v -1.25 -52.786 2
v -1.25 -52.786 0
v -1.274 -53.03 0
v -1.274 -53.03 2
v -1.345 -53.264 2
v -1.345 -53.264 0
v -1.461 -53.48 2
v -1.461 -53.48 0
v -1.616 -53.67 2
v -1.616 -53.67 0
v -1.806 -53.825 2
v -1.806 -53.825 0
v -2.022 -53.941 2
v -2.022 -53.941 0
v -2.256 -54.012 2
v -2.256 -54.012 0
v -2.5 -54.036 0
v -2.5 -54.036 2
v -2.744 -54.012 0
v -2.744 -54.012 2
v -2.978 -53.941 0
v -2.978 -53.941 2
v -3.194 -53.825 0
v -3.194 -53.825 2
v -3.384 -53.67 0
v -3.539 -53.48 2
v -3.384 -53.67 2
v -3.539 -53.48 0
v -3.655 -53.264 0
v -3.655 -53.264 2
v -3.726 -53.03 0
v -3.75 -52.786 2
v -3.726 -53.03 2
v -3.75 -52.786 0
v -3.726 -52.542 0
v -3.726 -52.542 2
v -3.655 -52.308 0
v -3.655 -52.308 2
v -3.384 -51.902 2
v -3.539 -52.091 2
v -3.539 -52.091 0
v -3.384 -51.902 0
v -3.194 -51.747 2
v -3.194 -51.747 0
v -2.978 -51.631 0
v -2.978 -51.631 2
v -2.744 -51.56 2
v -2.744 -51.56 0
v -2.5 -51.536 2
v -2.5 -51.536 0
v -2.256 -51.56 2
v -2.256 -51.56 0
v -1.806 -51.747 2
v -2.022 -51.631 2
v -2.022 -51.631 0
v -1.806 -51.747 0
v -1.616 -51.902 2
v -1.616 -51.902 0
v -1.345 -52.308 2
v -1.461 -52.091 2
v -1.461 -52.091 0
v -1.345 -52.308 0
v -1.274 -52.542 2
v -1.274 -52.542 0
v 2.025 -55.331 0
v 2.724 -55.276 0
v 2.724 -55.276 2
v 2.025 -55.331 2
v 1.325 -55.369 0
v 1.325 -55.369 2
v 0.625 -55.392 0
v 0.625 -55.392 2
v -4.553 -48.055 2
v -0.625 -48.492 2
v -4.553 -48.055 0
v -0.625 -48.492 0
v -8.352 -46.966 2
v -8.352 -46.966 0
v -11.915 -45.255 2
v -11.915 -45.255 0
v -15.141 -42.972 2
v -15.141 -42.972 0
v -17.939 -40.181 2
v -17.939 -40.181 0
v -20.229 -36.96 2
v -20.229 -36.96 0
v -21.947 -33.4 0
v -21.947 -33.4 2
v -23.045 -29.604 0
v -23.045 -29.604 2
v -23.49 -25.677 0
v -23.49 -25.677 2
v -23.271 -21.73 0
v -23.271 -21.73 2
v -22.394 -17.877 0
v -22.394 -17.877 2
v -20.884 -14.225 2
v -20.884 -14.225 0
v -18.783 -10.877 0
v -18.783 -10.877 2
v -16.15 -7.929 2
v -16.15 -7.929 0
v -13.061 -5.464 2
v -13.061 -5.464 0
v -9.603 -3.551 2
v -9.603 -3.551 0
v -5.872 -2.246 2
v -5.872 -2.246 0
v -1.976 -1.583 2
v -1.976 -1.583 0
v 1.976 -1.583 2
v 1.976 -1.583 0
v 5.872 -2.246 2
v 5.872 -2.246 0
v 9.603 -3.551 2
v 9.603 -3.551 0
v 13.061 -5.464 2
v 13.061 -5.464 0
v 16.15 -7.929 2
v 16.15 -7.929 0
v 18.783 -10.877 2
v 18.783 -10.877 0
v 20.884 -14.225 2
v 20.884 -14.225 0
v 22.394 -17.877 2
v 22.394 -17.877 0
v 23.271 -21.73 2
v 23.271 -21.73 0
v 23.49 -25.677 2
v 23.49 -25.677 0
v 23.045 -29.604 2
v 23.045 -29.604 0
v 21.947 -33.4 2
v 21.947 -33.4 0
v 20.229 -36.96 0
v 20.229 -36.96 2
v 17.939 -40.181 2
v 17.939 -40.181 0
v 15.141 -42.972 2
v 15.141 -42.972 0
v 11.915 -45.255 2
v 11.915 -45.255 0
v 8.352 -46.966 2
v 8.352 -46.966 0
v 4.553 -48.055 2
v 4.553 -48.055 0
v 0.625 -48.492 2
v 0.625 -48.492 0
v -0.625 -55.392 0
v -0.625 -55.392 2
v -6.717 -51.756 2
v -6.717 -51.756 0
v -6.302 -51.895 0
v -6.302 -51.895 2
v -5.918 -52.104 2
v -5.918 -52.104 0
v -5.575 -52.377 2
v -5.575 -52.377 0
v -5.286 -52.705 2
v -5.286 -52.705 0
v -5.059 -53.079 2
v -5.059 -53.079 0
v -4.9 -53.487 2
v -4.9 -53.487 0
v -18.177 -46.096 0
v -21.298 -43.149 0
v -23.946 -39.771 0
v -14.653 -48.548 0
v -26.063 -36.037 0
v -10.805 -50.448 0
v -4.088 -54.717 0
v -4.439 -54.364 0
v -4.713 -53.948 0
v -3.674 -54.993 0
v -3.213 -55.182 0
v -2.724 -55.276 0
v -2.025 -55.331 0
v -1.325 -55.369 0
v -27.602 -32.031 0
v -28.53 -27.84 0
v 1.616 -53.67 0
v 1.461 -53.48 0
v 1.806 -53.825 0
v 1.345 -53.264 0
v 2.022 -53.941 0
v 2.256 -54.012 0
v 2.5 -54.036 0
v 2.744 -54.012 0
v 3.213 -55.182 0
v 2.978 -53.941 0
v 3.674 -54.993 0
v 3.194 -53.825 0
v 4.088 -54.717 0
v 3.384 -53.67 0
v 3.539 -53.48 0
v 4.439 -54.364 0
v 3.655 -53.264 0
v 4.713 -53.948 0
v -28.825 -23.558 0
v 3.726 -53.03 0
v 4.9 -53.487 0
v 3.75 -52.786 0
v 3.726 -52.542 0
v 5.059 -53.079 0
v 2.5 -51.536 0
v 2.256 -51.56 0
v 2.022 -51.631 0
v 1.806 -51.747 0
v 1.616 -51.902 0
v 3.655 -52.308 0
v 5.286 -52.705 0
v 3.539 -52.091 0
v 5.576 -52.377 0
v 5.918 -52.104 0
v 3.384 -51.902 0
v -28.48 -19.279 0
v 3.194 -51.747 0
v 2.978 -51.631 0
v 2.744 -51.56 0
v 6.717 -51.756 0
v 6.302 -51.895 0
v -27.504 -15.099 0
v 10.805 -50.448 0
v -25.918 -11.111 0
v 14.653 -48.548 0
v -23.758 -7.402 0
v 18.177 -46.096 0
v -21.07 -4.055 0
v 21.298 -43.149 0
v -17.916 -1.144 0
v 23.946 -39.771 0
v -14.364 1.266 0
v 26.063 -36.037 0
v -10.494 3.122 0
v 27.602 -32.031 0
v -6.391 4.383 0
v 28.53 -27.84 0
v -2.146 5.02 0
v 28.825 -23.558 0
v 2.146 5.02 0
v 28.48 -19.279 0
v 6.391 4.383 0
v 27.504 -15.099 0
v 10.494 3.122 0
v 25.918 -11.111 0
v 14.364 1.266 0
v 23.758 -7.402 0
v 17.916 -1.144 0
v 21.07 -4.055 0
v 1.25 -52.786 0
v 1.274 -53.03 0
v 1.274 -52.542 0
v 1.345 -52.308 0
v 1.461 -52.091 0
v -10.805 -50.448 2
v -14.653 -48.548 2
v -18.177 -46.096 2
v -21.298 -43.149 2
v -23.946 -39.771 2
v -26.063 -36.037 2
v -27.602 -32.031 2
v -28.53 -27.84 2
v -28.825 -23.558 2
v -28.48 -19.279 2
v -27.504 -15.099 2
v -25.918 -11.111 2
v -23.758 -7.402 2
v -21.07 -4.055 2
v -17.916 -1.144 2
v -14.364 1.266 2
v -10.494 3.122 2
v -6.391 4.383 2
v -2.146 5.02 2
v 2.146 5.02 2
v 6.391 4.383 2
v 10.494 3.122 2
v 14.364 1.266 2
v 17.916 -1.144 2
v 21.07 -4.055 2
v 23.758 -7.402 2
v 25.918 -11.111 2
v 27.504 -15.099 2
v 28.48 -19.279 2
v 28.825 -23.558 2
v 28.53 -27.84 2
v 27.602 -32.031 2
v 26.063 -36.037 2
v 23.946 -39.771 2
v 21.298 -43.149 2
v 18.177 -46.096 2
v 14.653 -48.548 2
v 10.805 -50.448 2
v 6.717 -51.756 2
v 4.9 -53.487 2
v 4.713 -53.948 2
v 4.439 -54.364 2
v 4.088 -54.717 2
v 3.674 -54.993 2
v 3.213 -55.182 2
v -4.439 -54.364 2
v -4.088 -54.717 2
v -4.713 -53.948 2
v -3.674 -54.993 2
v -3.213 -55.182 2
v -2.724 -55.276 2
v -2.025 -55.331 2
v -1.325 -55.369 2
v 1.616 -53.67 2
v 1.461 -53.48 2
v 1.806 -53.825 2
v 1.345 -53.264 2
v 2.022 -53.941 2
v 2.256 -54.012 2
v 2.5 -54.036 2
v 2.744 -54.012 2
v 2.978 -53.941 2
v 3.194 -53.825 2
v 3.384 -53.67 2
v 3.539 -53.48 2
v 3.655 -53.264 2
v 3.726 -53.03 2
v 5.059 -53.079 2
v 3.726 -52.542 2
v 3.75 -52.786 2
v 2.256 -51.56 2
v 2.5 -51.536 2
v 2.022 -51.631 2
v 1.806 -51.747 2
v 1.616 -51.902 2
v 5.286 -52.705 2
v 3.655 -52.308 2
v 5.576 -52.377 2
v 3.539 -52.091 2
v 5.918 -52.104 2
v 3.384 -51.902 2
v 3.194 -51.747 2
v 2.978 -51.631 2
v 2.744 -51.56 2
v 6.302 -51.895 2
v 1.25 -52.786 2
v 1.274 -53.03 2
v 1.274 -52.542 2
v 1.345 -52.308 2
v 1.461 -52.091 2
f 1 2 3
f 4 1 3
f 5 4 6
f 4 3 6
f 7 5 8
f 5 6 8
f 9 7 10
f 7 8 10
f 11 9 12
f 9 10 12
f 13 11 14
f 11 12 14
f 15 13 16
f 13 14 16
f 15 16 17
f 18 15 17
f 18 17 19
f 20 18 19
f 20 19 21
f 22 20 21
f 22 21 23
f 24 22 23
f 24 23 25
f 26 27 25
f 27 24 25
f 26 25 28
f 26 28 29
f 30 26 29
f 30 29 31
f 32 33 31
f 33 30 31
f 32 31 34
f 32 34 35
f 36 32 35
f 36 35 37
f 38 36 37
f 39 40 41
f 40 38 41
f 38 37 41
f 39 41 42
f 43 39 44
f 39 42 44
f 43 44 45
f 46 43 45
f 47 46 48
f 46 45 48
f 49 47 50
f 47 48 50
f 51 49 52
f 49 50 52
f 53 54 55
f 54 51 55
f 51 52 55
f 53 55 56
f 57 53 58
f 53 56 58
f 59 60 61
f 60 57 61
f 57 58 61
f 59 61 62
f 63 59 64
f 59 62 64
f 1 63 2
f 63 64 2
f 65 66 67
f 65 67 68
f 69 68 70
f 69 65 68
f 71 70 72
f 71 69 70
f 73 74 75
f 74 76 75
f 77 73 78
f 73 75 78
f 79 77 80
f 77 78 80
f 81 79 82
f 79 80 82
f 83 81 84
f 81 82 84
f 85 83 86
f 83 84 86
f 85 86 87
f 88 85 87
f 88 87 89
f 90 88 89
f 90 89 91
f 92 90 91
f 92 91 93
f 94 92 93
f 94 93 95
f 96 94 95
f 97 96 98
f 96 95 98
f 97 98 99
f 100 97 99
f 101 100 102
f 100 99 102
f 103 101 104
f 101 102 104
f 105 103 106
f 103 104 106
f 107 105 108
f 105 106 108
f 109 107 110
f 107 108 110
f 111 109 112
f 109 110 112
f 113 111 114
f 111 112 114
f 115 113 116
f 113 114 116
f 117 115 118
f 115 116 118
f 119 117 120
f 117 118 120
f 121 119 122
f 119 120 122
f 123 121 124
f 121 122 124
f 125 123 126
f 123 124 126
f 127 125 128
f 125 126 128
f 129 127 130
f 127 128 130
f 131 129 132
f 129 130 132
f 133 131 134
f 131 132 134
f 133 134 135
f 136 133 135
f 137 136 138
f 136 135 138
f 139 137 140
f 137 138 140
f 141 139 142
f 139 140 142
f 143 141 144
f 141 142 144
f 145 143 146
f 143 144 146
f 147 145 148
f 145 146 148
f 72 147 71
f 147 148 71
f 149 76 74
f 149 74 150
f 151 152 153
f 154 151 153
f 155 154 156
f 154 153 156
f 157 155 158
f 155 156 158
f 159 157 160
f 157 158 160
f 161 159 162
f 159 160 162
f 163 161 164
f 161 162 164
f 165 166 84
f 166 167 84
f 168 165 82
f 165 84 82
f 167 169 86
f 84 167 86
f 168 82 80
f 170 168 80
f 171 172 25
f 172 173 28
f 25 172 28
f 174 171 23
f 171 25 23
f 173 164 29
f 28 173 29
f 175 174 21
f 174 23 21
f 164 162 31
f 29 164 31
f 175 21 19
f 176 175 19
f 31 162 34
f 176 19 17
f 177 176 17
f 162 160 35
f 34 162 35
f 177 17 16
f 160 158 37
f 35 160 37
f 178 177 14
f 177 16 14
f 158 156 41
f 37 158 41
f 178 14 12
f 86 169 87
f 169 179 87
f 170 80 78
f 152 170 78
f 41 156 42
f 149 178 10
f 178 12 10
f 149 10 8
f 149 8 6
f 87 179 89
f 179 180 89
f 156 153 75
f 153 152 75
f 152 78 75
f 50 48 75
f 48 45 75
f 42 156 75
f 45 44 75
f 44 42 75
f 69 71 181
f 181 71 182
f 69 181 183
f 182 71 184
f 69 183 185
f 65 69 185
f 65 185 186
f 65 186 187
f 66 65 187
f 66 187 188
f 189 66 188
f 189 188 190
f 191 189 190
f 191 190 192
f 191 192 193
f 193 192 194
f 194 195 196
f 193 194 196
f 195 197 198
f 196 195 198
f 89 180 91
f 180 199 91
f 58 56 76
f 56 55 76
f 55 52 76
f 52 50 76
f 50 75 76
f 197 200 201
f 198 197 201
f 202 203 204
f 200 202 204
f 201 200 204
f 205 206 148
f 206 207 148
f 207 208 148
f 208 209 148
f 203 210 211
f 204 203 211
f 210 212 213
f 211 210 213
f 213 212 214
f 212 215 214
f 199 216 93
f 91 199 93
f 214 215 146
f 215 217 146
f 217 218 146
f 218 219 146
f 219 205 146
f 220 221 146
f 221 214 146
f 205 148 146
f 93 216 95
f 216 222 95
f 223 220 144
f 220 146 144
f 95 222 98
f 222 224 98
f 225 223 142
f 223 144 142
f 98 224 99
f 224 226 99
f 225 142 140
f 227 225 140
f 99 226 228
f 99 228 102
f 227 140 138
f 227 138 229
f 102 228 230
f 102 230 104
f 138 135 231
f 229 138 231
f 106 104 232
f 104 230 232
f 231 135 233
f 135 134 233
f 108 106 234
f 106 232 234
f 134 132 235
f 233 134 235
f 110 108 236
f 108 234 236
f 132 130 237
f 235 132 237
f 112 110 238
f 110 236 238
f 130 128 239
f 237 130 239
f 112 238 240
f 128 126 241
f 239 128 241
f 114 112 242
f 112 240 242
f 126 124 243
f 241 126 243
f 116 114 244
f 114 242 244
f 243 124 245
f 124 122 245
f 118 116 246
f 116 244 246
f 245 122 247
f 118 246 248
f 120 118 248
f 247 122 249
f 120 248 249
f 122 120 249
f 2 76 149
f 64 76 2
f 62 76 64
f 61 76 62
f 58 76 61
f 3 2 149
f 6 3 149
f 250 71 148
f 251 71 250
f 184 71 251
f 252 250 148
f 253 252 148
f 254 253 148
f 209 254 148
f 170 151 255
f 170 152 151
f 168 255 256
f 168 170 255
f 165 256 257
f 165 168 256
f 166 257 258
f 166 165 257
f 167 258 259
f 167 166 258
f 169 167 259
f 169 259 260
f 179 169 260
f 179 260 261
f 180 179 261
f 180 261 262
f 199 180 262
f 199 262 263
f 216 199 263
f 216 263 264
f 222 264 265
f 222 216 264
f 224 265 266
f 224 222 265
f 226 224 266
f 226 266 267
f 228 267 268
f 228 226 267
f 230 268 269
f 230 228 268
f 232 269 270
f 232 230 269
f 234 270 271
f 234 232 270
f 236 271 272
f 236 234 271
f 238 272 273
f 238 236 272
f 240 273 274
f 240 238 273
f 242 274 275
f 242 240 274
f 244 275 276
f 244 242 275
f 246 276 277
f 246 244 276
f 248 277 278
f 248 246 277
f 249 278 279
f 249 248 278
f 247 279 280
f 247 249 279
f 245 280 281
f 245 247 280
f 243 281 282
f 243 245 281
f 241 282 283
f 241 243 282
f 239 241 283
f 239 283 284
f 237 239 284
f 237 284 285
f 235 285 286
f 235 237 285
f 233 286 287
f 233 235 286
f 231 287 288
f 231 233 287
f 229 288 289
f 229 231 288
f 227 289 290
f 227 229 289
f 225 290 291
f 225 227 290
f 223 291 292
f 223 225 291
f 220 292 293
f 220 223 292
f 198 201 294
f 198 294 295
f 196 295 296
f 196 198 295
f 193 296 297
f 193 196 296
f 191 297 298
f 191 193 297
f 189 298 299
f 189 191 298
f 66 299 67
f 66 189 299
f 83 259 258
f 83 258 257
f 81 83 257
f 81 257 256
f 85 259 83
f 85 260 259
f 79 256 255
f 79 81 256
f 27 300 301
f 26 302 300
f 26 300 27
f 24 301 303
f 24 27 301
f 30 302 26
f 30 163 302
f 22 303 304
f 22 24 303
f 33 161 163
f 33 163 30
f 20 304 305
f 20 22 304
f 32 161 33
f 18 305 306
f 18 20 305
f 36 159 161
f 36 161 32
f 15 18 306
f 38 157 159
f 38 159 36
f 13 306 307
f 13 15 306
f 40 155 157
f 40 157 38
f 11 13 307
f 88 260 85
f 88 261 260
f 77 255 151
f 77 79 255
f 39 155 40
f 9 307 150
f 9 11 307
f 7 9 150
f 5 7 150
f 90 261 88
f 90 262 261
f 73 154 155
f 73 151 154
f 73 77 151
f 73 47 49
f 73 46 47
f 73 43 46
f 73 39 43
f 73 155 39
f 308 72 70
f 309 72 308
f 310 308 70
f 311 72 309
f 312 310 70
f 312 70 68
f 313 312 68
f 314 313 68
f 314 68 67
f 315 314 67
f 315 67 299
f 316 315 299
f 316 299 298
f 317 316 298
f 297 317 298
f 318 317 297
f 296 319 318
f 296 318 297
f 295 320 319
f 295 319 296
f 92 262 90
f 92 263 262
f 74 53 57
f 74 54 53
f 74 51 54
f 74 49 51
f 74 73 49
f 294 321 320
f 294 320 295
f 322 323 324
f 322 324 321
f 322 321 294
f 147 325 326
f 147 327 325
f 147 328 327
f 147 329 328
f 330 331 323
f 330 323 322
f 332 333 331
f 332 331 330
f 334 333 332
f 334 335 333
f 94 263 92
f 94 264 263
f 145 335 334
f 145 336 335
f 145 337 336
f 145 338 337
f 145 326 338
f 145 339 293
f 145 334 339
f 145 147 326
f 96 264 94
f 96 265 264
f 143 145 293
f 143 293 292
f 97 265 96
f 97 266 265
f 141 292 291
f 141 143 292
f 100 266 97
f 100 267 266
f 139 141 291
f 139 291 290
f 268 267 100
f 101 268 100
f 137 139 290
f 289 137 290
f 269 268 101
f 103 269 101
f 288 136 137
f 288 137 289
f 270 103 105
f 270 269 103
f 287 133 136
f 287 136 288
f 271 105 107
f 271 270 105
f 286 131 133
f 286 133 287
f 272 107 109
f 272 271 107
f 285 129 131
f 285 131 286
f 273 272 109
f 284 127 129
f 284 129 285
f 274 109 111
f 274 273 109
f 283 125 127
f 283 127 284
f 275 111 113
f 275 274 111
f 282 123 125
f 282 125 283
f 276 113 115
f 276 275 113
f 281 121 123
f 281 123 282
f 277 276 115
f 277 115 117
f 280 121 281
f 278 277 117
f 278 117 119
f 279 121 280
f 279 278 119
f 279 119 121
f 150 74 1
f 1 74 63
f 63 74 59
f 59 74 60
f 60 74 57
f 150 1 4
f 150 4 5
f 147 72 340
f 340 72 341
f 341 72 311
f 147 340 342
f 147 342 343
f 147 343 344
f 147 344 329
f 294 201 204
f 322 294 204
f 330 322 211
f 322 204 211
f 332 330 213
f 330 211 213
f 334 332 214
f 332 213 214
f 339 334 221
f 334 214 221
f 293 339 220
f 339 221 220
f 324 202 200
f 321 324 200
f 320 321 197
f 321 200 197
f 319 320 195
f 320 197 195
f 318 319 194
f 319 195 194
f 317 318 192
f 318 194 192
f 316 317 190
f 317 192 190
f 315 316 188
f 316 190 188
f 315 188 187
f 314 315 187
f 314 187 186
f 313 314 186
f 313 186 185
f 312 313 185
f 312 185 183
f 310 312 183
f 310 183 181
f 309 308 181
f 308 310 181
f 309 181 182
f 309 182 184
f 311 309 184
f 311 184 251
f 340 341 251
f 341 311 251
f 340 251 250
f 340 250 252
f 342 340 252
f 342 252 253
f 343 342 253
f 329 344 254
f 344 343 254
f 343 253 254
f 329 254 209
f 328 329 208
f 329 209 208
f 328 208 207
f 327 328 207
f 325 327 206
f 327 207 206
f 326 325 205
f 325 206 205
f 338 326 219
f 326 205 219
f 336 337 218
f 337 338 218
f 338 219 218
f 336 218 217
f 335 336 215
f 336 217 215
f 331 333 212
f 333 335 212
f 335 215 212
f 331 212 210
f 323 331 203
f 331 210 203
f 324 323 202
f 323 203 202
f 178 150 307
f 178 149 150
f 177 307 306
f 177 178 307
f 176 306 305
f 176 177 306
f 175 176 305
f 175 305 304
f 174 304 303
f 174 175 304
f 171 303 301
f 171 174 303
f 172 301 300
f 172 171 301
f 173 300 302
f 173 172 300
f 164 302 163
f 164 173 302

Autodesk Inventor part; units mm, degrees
ref_plane "YZ Plane" through (0, 0, 0) normal (1, 0, 0) x (0, 1, 0)
ref_plane "XZ Plane" through (0, 0, 0) normal (0, 1, 0) x (-1, 0, 0)
ref_plane "XY Plane" through (0, 0, 0) normal (0, 0, 1) x (1, 0, 0)
sketch "Skizze1" plane through (0, 0, 0) normal (0, 0, 1) x (1, 0, 0)
  line L0 (-6, 0) -> (6, 0) construction
  arc A0 (0.625, -48.4917) -> (-0.625, -48.4917) centre (0, -25) ccw
  line L1 (0, 23.3134) -> (0, -61.6825) projected
  line L2 (-34.59, 0) -> (46.12, 0) projected
  line L3 (-0.625, -48.4917) -> (-0.625, -55.3917)
  line L4 (-0.625, -6.5402) -> (-0.625, -13.29) construction
  line L5 (-2.7947, 5.1) -> (3.6722, 5.1) construction
  arc A1 (6.7169, -51.7565) -> (-6.7169, -51.7565) centre (0, -23.725) ccw
  arc A2 (-2.724, -55.2758) -> (-0.625, -55.3917) centre (0, -25) ccw
  arc A3 (-4.8997, -53.4868) -> (-2.724, -55.2758) centre (-2.5, -52.7859) ccw
  arc A4 (-4.8997, -53.4868) -> (-6.7169, -51.7565) centre (-7.2995, -54.1877) ccw
  line L6 (0.625, -48.4917) -> (0.625, -55.3917)
  line L7 (0.625, -6.5402) -> (0.625, -13.29) construction
  arc A5 (0.625, -55.3917) -> (2.724, -55.2758) centre (0, -25) ccw
  arc A6 (2.724, -55.2758) -> (4.8997, -53.4868) centre (2.5, -52.7859) ccw
  arc A7 (6.7169, -51.7565) -> (4.8997, -53.4868) centre (7.2995, -54.1877) ccw
  circle A8 centre (-2.5, -52.7859) radius 1.25
  circle A9 centre (2.5, -52.7859) radius 1.25
  dimension "d0" = 47
  dimension "d1" = 6.9
  dimension "d6" = 0.625
  dimension "d7" = 5.1
  dimension "d8" = 1.275
  dimension "d9" = 2.5
  dimension "d10" = 2.5
  dimension "d11" = 1.875
  dimension "d12" = 2.5
  dimension "d13" = 2.5
  dimension "d14" = 25
extrude "Körper" add sketch "Skizze1" along normal blind 2
equation "\"d0\" = ND"
equation "\"d1\" = SRB2"
equation "\"d6\" = 0.25 * SD5"
equation "\"d7\" = SRB1"
equation "\"d8\" = 0.25 * SRB1"
equation "\"d9\" = SD5"
equation "\"d10\" = SD5"
equation "\"d11\" = 0.75 * SD5"
equation "\"d12\" = SD5"
equation "\"d13\" = SD5"
equation "\"d14\" = 0.5 * WD"
equation "\"d2\" = SD"
equation "\"SD\" = 2"
equation "\"SRB1\" = 5.1"
equation "\"ND\" = 47"
equation "\"SRB2\" = 6.9"
equation "\"SD5\" = 2.5"
equation "\"SD3\" = 45.8"
equation "\"WDMAX\" = 52"
equation "\"WD\" = 50"
properties part number "R-Ring50"
